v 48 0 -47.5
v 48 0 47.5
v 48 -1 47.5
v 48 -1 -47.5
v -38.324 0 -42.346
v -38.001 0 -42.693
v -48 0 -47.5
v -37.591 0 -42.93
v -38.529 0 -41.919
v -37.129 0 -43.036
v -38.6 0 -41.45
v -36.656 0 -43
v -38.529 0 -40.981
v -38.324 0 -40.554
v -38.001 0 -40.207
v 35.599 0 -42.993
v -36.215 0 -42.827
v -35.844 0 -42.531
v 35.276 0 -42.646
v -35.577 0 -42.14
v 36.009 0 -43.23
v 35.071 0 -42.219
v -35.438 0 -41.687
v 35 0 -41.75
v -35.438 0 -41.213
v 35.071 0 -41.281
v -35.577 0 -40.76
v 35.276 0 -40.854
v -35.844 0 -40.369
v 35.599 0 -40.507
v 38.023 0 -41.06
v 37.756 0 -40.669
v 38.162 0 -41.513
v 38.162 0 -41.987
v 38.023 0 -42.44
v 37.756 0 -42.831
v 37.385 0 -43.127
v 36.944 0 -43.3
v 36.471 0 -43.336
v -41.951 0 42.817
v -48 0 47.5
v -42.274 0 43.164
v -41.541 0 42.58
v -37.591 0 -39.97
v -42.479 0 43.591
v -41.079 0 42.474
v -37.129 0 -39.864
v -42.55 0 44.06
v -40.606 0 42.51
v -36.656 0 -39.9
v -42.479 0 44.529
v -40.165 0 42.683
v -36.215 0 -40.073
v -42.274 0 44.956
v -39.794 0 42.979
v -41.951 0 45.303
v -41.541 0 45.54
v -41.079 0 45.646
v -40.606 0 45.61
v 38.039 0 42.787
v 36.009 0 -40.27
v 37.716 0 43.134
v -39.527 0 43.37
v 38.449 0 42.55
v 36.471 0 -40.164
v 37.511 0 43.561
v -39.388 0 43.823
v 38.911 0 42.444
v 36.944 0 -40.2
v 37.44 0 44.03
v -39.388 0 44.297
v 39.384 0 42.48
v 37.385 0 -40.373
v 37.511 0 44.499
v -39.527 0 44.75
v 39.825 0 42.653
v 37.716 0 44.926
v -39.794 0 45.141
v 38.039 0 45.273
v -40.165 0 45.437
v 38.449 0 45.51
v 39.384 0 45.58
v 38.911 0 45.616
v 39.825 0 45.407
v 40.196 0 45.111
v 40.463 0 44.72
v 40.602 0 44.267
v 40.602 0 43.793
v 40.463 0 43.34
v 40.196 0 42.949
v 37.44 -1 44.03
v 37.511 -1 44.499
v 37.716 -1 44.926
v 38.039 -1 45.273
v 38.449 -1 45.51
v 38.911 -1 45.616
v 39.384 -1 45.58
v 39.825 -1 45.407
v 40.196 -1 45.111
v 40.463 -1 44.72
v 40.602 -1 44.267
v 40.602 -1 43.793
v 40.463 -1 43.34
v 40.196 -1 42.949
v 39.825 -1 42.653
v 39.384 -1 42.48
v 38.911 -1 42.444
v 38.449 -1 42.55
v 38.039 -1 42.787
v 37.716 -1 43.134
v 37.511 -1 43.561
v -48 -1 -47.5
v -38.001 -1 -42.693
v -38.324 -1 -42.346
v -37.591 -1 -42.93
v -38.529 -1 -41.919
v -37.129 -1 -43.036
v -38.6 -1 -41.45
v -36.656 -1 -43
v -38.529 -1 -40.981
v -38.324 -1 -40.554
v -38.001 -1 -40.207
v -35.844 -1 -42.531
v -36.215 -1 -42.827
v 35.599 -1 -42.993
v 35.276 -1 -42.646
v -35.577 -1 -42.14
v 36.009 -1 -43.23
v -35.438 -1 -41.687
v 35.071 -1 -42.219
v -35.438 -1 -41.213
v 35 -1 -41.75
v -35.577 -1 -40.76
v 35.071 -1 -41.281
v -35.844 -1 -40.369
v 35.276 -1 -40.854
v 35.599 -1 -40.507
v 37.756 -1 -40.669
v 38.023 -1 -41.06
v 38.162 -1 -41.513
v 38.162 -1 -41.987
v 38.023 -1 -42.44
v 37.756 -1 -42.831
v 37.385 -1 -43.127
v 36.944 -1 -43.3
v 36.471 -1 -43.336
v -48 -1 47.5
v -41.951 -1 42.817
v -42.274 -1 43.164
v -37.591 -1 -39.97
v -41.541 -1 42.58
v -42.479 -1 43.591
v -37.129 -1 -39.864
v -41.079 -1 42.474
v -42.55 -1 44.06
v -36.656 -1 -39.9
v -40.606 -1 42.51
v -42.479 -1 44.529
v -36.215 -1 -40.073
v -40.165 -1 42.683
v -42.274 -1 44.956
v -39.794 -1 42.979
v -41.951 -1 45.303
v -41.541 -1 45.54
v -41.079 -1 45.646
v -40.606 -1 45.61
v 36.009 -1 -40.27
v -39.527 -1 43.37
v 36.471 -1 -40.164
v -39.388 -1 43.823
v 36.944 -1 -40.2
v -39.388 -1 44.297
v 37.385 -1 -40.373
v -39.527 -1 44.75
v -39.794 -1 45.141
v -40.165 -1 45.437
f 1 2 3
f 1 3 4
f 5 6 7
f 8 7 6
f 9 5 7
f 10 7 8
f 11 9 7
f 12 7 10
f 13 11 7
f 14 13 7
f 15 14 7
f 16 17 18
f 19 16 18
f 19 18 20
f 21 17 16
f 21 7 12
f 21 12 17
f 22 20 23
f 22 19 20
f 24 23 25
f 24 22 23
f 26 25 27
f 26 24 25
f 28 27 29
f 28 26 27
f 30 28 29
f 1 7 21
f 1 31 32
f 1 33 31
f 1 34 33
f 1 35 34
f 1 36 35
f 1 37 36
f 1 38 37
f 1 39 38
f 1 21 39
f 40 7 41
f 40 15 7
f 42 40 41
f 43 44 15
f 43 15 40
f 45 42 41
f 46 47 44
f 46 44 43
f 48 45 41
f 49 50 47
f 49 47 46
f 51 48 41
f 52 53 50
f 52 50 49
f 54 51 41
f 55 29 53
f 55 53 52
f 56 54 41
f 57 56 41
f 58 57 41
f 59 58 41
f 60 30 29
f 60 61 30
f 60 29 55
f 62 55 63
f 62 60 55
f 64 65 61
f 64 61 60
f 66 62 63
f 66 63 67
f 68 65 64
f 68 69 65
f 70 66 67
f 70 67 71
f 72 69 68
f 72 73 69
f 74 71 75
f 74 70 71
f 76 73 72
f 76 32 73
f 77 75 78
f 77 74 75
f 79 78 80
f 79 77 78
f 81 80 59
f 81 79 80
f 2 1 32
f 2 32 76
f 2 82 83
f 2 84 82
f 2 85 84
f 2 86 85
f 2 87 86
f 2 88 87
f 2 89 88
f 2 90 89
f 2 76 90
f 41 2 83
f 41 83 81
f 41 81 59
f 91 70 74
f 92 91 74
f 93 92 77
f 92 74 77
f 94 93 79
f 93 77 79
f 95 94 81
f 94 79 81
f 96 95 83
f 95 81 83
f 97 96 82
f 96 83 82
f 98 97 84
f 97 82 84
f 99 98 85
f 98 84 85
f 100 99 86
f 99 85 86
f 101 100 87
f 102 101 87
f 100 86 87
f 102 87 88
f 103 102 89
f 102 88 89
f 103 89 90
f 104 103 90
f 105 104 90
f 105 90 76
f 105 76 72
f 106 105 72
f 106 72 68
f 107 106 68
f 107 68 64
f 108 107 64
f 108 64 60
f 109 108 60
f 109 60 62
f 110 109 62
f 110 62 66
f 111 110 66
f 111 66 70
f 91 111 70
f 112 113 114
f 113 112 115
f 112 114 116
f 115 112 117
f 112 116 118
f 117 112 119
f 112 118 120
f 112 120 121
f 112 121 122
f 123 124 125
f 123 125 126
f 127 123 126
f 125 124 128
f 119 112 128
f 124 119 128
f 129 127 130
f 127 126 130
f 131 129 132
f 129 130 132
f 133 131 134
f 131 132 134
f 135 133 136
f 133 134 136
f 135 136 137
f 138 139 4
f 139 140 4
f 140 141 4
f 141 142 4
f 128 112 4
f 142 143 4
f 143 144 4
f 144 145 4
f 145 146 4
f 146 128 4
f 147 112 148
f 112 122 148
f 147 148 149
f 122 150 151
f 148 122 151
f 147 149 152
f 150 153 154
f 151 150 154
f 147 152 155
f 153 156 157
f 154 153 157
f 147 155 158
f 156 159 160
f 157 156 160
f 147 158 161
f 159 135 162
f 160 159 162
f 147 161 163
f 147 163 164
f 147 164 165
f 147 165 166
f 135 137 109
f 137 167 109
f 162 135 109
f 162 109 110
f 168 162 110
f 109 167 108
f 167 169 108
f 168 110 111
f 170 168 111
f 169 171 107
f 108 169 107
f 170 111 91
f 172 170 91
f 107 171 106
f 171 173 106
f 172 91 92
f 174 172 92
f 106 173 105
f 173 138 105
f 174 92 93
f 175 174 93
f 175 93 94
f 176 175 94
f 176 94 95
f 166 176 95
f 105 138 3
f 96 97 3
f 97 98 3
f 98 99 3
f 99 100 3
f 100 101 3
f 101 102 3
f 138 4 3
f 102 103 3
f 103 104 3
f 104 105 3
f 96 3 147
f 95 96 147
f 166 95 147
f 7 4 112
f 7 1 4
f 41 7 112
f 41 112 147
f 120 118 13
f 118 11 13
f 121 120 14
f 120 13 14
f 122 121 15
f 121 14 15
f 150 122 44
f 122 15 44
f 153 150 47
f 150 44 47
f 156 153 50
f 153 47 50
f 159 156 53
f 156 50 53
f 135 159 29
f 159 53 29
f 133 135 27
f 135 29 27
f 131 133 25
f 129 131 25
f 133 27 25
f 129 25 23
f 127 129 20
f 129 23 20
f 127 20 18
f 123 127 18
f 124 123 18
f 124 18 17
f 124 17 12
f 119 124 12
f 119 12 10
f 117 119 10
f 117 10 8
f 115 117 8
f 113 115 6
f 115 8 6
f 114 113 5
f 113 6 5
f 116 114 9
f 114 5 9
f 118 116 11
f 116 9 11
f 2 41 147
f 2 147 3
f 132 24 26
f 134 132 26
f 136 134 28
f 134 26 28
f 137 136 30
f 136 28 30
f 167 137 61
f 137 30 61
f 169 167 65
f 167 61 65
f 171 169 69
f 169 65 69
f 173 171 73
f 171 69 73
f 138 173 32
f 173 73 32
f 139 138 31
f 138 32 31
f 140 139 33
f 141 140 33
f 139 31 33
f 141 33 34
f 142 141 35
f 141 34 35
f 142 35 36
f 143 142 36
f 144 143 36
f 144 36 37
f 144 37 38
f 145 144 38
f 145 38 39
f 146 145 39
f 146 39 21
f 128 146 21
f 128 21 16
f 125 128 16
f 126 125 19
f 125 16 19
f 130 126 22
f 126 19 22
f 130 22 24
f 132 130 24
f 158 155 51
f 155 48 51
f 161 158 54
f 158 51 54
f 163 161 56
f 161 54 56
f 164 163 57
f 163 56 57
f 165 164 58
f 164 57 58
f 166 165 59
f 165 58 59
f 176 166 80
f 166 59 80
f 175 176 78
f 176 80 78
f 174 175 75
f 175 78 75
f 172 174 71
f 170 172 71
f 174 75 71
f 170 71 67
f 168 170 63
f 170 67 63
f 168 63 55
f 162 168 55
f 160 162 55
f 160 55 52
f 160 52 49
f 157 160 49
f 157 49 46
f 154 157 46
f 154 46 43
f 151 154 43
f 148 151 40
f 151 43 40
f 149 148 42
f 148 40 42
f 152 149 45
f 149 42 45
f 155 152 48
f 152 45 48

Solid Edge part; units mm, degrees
sketch "Sketch1" plane through (0, 0, 0) normal (0, -1, 0) x (1, 0, 0)
  line L0 (-48, 47.5) -> (48, 47.5)
  line L1 (48, 47.5) -> (48, -47.5)
  line L2 (48, -47.5) -> (-48, -47.5)
  line L3 (-48, -47.5) -> (-48, 47.5)
  dimension "D1" = 48
  dimension "D2" = 48
  dimension "D3" = 47.5
  dimension "D4" = 47.5
extrude "Protrusion1" add sketch "Sketch1" along normal blind 1
sketch "Sketch2" plane through (0, 0, 0) normal (0, 1, 0) x (-1, 0, 0)
  circle A0 centre (40.96, 44.06) radius 1.59
  circle A1 centre (-39.03, 44.03) radius 1.59
  circle A2 centre (-36.59, -41.75) radius 1.59
  circle A3 centre (37.01, -41.45) radius 1.59
  dimension "D1" = 7.04
  dimension "D2" = 3.44
  dimension "D3" = 3.47
  dimension "D4" = 8.97
  dimension "D5" = 5.75
  dimension "D6" = 11.41
  dimension "D7" = 6.05
  dimension "D8" = 10.99
extrude "ExtrudedCutout_1" cut sketch "Sketch2" against normal blind 32.4613
